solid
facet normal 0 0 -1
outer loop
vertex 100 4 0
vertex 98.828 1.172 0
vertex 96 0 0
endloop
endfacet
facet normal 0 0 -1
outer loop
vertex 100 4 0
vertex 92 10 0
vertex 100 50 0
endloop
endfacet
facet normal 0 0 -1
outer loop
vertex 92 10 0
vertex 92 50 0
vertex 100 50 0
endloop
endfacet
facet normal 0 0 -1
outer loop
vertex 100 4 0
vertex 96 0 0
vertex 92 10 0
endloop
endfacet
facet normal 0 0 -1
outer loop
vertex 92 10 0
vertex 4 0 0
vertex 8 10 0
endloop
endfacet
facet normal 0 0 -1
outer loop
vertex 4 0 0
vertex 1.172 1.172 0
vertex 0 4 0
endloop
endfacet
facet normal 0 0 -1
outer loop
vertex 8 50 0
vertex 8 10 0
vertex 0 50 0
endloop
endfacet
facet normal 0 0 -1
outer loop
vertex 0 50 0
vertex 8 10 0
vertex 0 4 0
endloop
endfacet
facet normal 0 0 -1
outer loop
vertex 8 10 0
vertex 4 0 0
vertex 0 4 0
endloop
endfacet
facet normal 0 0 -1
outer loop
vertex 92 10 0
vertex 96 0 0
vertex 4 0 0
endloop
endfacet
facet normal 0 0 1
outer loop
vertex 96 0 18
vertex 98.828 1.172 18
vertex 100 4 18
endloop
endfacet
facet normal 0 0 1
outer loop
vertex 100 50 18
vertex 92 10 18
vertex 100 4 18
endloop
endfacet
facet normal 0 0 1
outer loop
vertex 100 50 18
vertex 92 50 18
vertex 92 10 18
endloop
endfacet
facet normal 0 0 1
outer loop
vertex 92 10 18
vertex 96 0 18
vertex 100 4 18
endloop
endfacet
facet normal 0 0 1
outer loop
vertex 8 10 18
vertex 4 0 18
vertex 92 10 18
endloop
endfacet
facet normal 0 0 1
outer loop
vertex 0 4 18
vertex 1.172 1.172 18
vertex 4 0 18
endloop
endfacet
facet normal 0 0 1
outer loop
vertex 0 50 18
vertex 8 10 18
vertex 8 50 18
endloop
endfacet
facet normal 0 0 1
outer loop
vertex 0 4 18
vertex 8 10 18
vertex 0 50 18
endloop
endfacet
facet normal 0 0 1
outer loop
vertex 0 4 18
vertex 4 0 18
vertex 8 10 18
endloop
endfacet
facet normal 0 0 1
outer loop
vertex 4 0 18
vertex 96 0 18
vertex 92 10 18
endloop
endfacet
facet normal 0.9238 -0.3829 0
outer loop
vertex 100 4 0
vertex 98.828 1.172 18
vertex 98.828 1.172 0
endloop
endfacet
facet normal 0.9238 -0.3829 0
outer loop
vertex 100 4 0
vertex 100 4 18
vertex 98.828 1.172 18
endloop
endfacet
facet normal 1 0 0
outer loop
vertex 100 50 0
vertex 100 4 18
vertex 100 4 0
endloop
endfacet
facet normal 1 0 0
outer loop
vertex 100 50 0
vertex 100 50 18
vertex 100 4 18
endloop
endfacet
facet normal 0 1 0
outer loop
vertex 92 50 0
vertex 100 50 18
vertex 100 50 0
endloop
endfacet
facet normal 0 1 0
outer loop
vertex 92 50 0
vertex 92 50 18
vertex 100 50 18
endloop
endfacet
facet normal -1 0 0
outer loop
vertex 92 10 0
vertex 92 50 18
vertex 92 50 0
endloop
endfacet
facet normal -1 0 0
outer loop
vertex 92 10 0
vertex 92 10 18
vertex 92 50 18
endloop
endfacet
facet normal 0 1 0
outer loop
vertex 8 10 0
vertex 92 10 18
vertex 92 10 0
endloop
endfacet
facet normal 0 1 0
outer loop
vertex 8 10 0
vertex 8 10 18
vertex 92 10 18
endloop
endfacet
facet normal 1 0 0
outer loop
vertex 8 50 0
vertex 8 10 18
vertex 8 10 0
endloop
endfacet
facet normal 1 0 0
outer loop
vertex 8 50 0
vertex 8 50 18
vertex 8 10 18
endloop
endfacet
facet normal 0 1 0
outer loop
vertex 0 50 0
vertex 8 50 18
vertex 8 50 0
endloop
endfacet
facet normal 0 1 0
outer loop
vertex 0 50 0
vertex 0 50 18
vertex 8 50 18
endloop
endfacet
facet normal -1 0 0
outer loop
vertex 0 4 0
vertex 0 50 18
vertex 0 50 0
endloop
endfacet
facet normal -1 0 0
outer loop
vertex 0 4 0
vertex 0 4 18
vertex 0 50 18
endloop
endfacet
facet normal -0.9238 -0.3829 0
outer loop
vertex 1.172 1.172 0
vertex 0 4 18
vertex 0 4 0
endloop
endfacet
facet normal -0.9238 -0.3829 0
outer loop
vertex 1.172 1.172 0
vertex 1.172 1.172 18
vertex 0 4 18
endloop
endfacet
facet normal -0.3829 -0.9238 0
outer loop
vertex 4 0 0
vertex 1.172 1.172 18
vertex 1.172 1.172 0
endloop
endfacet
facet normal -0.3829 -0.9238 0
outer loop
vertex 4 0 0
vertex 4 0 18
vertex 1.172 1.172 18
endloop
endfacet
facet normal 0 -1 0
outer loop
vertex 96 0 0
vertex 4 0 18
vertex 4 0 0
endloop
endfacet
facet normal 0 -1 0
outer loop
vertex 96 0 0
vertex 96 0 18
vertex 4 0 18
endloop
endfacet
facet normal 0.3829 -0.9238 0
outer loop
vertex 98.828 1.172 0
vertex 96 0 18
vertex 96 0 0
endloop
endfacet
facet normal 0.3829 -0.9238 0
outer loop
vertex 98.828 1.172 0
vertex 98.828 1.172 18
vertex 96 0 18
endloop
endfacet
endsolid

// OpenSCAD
$fn = 32;

// ----------------------------------------------------------------------
// Heat sink frame: 100 x 50 mm frame, 8 mm walls
// ----------------------------------------------------------------------

// --- parameters (mm) ---
profile_height = 18;      // extrusion height
profile_points = 12;      // points of the closed outline

profile = [[0, 4], [1.172, 1.172], [4, 0], [96, 0], [98.828, 1.172], [100, 4], [100, 50], [92, 50], [92, 10], [8, 10], [8, 50], [0, 50]];  // single closed polygon, 12 points, counter clockwise

// --- the one profile operation ---
linear_extrude(height = profile_height) polygon(points = profile);
